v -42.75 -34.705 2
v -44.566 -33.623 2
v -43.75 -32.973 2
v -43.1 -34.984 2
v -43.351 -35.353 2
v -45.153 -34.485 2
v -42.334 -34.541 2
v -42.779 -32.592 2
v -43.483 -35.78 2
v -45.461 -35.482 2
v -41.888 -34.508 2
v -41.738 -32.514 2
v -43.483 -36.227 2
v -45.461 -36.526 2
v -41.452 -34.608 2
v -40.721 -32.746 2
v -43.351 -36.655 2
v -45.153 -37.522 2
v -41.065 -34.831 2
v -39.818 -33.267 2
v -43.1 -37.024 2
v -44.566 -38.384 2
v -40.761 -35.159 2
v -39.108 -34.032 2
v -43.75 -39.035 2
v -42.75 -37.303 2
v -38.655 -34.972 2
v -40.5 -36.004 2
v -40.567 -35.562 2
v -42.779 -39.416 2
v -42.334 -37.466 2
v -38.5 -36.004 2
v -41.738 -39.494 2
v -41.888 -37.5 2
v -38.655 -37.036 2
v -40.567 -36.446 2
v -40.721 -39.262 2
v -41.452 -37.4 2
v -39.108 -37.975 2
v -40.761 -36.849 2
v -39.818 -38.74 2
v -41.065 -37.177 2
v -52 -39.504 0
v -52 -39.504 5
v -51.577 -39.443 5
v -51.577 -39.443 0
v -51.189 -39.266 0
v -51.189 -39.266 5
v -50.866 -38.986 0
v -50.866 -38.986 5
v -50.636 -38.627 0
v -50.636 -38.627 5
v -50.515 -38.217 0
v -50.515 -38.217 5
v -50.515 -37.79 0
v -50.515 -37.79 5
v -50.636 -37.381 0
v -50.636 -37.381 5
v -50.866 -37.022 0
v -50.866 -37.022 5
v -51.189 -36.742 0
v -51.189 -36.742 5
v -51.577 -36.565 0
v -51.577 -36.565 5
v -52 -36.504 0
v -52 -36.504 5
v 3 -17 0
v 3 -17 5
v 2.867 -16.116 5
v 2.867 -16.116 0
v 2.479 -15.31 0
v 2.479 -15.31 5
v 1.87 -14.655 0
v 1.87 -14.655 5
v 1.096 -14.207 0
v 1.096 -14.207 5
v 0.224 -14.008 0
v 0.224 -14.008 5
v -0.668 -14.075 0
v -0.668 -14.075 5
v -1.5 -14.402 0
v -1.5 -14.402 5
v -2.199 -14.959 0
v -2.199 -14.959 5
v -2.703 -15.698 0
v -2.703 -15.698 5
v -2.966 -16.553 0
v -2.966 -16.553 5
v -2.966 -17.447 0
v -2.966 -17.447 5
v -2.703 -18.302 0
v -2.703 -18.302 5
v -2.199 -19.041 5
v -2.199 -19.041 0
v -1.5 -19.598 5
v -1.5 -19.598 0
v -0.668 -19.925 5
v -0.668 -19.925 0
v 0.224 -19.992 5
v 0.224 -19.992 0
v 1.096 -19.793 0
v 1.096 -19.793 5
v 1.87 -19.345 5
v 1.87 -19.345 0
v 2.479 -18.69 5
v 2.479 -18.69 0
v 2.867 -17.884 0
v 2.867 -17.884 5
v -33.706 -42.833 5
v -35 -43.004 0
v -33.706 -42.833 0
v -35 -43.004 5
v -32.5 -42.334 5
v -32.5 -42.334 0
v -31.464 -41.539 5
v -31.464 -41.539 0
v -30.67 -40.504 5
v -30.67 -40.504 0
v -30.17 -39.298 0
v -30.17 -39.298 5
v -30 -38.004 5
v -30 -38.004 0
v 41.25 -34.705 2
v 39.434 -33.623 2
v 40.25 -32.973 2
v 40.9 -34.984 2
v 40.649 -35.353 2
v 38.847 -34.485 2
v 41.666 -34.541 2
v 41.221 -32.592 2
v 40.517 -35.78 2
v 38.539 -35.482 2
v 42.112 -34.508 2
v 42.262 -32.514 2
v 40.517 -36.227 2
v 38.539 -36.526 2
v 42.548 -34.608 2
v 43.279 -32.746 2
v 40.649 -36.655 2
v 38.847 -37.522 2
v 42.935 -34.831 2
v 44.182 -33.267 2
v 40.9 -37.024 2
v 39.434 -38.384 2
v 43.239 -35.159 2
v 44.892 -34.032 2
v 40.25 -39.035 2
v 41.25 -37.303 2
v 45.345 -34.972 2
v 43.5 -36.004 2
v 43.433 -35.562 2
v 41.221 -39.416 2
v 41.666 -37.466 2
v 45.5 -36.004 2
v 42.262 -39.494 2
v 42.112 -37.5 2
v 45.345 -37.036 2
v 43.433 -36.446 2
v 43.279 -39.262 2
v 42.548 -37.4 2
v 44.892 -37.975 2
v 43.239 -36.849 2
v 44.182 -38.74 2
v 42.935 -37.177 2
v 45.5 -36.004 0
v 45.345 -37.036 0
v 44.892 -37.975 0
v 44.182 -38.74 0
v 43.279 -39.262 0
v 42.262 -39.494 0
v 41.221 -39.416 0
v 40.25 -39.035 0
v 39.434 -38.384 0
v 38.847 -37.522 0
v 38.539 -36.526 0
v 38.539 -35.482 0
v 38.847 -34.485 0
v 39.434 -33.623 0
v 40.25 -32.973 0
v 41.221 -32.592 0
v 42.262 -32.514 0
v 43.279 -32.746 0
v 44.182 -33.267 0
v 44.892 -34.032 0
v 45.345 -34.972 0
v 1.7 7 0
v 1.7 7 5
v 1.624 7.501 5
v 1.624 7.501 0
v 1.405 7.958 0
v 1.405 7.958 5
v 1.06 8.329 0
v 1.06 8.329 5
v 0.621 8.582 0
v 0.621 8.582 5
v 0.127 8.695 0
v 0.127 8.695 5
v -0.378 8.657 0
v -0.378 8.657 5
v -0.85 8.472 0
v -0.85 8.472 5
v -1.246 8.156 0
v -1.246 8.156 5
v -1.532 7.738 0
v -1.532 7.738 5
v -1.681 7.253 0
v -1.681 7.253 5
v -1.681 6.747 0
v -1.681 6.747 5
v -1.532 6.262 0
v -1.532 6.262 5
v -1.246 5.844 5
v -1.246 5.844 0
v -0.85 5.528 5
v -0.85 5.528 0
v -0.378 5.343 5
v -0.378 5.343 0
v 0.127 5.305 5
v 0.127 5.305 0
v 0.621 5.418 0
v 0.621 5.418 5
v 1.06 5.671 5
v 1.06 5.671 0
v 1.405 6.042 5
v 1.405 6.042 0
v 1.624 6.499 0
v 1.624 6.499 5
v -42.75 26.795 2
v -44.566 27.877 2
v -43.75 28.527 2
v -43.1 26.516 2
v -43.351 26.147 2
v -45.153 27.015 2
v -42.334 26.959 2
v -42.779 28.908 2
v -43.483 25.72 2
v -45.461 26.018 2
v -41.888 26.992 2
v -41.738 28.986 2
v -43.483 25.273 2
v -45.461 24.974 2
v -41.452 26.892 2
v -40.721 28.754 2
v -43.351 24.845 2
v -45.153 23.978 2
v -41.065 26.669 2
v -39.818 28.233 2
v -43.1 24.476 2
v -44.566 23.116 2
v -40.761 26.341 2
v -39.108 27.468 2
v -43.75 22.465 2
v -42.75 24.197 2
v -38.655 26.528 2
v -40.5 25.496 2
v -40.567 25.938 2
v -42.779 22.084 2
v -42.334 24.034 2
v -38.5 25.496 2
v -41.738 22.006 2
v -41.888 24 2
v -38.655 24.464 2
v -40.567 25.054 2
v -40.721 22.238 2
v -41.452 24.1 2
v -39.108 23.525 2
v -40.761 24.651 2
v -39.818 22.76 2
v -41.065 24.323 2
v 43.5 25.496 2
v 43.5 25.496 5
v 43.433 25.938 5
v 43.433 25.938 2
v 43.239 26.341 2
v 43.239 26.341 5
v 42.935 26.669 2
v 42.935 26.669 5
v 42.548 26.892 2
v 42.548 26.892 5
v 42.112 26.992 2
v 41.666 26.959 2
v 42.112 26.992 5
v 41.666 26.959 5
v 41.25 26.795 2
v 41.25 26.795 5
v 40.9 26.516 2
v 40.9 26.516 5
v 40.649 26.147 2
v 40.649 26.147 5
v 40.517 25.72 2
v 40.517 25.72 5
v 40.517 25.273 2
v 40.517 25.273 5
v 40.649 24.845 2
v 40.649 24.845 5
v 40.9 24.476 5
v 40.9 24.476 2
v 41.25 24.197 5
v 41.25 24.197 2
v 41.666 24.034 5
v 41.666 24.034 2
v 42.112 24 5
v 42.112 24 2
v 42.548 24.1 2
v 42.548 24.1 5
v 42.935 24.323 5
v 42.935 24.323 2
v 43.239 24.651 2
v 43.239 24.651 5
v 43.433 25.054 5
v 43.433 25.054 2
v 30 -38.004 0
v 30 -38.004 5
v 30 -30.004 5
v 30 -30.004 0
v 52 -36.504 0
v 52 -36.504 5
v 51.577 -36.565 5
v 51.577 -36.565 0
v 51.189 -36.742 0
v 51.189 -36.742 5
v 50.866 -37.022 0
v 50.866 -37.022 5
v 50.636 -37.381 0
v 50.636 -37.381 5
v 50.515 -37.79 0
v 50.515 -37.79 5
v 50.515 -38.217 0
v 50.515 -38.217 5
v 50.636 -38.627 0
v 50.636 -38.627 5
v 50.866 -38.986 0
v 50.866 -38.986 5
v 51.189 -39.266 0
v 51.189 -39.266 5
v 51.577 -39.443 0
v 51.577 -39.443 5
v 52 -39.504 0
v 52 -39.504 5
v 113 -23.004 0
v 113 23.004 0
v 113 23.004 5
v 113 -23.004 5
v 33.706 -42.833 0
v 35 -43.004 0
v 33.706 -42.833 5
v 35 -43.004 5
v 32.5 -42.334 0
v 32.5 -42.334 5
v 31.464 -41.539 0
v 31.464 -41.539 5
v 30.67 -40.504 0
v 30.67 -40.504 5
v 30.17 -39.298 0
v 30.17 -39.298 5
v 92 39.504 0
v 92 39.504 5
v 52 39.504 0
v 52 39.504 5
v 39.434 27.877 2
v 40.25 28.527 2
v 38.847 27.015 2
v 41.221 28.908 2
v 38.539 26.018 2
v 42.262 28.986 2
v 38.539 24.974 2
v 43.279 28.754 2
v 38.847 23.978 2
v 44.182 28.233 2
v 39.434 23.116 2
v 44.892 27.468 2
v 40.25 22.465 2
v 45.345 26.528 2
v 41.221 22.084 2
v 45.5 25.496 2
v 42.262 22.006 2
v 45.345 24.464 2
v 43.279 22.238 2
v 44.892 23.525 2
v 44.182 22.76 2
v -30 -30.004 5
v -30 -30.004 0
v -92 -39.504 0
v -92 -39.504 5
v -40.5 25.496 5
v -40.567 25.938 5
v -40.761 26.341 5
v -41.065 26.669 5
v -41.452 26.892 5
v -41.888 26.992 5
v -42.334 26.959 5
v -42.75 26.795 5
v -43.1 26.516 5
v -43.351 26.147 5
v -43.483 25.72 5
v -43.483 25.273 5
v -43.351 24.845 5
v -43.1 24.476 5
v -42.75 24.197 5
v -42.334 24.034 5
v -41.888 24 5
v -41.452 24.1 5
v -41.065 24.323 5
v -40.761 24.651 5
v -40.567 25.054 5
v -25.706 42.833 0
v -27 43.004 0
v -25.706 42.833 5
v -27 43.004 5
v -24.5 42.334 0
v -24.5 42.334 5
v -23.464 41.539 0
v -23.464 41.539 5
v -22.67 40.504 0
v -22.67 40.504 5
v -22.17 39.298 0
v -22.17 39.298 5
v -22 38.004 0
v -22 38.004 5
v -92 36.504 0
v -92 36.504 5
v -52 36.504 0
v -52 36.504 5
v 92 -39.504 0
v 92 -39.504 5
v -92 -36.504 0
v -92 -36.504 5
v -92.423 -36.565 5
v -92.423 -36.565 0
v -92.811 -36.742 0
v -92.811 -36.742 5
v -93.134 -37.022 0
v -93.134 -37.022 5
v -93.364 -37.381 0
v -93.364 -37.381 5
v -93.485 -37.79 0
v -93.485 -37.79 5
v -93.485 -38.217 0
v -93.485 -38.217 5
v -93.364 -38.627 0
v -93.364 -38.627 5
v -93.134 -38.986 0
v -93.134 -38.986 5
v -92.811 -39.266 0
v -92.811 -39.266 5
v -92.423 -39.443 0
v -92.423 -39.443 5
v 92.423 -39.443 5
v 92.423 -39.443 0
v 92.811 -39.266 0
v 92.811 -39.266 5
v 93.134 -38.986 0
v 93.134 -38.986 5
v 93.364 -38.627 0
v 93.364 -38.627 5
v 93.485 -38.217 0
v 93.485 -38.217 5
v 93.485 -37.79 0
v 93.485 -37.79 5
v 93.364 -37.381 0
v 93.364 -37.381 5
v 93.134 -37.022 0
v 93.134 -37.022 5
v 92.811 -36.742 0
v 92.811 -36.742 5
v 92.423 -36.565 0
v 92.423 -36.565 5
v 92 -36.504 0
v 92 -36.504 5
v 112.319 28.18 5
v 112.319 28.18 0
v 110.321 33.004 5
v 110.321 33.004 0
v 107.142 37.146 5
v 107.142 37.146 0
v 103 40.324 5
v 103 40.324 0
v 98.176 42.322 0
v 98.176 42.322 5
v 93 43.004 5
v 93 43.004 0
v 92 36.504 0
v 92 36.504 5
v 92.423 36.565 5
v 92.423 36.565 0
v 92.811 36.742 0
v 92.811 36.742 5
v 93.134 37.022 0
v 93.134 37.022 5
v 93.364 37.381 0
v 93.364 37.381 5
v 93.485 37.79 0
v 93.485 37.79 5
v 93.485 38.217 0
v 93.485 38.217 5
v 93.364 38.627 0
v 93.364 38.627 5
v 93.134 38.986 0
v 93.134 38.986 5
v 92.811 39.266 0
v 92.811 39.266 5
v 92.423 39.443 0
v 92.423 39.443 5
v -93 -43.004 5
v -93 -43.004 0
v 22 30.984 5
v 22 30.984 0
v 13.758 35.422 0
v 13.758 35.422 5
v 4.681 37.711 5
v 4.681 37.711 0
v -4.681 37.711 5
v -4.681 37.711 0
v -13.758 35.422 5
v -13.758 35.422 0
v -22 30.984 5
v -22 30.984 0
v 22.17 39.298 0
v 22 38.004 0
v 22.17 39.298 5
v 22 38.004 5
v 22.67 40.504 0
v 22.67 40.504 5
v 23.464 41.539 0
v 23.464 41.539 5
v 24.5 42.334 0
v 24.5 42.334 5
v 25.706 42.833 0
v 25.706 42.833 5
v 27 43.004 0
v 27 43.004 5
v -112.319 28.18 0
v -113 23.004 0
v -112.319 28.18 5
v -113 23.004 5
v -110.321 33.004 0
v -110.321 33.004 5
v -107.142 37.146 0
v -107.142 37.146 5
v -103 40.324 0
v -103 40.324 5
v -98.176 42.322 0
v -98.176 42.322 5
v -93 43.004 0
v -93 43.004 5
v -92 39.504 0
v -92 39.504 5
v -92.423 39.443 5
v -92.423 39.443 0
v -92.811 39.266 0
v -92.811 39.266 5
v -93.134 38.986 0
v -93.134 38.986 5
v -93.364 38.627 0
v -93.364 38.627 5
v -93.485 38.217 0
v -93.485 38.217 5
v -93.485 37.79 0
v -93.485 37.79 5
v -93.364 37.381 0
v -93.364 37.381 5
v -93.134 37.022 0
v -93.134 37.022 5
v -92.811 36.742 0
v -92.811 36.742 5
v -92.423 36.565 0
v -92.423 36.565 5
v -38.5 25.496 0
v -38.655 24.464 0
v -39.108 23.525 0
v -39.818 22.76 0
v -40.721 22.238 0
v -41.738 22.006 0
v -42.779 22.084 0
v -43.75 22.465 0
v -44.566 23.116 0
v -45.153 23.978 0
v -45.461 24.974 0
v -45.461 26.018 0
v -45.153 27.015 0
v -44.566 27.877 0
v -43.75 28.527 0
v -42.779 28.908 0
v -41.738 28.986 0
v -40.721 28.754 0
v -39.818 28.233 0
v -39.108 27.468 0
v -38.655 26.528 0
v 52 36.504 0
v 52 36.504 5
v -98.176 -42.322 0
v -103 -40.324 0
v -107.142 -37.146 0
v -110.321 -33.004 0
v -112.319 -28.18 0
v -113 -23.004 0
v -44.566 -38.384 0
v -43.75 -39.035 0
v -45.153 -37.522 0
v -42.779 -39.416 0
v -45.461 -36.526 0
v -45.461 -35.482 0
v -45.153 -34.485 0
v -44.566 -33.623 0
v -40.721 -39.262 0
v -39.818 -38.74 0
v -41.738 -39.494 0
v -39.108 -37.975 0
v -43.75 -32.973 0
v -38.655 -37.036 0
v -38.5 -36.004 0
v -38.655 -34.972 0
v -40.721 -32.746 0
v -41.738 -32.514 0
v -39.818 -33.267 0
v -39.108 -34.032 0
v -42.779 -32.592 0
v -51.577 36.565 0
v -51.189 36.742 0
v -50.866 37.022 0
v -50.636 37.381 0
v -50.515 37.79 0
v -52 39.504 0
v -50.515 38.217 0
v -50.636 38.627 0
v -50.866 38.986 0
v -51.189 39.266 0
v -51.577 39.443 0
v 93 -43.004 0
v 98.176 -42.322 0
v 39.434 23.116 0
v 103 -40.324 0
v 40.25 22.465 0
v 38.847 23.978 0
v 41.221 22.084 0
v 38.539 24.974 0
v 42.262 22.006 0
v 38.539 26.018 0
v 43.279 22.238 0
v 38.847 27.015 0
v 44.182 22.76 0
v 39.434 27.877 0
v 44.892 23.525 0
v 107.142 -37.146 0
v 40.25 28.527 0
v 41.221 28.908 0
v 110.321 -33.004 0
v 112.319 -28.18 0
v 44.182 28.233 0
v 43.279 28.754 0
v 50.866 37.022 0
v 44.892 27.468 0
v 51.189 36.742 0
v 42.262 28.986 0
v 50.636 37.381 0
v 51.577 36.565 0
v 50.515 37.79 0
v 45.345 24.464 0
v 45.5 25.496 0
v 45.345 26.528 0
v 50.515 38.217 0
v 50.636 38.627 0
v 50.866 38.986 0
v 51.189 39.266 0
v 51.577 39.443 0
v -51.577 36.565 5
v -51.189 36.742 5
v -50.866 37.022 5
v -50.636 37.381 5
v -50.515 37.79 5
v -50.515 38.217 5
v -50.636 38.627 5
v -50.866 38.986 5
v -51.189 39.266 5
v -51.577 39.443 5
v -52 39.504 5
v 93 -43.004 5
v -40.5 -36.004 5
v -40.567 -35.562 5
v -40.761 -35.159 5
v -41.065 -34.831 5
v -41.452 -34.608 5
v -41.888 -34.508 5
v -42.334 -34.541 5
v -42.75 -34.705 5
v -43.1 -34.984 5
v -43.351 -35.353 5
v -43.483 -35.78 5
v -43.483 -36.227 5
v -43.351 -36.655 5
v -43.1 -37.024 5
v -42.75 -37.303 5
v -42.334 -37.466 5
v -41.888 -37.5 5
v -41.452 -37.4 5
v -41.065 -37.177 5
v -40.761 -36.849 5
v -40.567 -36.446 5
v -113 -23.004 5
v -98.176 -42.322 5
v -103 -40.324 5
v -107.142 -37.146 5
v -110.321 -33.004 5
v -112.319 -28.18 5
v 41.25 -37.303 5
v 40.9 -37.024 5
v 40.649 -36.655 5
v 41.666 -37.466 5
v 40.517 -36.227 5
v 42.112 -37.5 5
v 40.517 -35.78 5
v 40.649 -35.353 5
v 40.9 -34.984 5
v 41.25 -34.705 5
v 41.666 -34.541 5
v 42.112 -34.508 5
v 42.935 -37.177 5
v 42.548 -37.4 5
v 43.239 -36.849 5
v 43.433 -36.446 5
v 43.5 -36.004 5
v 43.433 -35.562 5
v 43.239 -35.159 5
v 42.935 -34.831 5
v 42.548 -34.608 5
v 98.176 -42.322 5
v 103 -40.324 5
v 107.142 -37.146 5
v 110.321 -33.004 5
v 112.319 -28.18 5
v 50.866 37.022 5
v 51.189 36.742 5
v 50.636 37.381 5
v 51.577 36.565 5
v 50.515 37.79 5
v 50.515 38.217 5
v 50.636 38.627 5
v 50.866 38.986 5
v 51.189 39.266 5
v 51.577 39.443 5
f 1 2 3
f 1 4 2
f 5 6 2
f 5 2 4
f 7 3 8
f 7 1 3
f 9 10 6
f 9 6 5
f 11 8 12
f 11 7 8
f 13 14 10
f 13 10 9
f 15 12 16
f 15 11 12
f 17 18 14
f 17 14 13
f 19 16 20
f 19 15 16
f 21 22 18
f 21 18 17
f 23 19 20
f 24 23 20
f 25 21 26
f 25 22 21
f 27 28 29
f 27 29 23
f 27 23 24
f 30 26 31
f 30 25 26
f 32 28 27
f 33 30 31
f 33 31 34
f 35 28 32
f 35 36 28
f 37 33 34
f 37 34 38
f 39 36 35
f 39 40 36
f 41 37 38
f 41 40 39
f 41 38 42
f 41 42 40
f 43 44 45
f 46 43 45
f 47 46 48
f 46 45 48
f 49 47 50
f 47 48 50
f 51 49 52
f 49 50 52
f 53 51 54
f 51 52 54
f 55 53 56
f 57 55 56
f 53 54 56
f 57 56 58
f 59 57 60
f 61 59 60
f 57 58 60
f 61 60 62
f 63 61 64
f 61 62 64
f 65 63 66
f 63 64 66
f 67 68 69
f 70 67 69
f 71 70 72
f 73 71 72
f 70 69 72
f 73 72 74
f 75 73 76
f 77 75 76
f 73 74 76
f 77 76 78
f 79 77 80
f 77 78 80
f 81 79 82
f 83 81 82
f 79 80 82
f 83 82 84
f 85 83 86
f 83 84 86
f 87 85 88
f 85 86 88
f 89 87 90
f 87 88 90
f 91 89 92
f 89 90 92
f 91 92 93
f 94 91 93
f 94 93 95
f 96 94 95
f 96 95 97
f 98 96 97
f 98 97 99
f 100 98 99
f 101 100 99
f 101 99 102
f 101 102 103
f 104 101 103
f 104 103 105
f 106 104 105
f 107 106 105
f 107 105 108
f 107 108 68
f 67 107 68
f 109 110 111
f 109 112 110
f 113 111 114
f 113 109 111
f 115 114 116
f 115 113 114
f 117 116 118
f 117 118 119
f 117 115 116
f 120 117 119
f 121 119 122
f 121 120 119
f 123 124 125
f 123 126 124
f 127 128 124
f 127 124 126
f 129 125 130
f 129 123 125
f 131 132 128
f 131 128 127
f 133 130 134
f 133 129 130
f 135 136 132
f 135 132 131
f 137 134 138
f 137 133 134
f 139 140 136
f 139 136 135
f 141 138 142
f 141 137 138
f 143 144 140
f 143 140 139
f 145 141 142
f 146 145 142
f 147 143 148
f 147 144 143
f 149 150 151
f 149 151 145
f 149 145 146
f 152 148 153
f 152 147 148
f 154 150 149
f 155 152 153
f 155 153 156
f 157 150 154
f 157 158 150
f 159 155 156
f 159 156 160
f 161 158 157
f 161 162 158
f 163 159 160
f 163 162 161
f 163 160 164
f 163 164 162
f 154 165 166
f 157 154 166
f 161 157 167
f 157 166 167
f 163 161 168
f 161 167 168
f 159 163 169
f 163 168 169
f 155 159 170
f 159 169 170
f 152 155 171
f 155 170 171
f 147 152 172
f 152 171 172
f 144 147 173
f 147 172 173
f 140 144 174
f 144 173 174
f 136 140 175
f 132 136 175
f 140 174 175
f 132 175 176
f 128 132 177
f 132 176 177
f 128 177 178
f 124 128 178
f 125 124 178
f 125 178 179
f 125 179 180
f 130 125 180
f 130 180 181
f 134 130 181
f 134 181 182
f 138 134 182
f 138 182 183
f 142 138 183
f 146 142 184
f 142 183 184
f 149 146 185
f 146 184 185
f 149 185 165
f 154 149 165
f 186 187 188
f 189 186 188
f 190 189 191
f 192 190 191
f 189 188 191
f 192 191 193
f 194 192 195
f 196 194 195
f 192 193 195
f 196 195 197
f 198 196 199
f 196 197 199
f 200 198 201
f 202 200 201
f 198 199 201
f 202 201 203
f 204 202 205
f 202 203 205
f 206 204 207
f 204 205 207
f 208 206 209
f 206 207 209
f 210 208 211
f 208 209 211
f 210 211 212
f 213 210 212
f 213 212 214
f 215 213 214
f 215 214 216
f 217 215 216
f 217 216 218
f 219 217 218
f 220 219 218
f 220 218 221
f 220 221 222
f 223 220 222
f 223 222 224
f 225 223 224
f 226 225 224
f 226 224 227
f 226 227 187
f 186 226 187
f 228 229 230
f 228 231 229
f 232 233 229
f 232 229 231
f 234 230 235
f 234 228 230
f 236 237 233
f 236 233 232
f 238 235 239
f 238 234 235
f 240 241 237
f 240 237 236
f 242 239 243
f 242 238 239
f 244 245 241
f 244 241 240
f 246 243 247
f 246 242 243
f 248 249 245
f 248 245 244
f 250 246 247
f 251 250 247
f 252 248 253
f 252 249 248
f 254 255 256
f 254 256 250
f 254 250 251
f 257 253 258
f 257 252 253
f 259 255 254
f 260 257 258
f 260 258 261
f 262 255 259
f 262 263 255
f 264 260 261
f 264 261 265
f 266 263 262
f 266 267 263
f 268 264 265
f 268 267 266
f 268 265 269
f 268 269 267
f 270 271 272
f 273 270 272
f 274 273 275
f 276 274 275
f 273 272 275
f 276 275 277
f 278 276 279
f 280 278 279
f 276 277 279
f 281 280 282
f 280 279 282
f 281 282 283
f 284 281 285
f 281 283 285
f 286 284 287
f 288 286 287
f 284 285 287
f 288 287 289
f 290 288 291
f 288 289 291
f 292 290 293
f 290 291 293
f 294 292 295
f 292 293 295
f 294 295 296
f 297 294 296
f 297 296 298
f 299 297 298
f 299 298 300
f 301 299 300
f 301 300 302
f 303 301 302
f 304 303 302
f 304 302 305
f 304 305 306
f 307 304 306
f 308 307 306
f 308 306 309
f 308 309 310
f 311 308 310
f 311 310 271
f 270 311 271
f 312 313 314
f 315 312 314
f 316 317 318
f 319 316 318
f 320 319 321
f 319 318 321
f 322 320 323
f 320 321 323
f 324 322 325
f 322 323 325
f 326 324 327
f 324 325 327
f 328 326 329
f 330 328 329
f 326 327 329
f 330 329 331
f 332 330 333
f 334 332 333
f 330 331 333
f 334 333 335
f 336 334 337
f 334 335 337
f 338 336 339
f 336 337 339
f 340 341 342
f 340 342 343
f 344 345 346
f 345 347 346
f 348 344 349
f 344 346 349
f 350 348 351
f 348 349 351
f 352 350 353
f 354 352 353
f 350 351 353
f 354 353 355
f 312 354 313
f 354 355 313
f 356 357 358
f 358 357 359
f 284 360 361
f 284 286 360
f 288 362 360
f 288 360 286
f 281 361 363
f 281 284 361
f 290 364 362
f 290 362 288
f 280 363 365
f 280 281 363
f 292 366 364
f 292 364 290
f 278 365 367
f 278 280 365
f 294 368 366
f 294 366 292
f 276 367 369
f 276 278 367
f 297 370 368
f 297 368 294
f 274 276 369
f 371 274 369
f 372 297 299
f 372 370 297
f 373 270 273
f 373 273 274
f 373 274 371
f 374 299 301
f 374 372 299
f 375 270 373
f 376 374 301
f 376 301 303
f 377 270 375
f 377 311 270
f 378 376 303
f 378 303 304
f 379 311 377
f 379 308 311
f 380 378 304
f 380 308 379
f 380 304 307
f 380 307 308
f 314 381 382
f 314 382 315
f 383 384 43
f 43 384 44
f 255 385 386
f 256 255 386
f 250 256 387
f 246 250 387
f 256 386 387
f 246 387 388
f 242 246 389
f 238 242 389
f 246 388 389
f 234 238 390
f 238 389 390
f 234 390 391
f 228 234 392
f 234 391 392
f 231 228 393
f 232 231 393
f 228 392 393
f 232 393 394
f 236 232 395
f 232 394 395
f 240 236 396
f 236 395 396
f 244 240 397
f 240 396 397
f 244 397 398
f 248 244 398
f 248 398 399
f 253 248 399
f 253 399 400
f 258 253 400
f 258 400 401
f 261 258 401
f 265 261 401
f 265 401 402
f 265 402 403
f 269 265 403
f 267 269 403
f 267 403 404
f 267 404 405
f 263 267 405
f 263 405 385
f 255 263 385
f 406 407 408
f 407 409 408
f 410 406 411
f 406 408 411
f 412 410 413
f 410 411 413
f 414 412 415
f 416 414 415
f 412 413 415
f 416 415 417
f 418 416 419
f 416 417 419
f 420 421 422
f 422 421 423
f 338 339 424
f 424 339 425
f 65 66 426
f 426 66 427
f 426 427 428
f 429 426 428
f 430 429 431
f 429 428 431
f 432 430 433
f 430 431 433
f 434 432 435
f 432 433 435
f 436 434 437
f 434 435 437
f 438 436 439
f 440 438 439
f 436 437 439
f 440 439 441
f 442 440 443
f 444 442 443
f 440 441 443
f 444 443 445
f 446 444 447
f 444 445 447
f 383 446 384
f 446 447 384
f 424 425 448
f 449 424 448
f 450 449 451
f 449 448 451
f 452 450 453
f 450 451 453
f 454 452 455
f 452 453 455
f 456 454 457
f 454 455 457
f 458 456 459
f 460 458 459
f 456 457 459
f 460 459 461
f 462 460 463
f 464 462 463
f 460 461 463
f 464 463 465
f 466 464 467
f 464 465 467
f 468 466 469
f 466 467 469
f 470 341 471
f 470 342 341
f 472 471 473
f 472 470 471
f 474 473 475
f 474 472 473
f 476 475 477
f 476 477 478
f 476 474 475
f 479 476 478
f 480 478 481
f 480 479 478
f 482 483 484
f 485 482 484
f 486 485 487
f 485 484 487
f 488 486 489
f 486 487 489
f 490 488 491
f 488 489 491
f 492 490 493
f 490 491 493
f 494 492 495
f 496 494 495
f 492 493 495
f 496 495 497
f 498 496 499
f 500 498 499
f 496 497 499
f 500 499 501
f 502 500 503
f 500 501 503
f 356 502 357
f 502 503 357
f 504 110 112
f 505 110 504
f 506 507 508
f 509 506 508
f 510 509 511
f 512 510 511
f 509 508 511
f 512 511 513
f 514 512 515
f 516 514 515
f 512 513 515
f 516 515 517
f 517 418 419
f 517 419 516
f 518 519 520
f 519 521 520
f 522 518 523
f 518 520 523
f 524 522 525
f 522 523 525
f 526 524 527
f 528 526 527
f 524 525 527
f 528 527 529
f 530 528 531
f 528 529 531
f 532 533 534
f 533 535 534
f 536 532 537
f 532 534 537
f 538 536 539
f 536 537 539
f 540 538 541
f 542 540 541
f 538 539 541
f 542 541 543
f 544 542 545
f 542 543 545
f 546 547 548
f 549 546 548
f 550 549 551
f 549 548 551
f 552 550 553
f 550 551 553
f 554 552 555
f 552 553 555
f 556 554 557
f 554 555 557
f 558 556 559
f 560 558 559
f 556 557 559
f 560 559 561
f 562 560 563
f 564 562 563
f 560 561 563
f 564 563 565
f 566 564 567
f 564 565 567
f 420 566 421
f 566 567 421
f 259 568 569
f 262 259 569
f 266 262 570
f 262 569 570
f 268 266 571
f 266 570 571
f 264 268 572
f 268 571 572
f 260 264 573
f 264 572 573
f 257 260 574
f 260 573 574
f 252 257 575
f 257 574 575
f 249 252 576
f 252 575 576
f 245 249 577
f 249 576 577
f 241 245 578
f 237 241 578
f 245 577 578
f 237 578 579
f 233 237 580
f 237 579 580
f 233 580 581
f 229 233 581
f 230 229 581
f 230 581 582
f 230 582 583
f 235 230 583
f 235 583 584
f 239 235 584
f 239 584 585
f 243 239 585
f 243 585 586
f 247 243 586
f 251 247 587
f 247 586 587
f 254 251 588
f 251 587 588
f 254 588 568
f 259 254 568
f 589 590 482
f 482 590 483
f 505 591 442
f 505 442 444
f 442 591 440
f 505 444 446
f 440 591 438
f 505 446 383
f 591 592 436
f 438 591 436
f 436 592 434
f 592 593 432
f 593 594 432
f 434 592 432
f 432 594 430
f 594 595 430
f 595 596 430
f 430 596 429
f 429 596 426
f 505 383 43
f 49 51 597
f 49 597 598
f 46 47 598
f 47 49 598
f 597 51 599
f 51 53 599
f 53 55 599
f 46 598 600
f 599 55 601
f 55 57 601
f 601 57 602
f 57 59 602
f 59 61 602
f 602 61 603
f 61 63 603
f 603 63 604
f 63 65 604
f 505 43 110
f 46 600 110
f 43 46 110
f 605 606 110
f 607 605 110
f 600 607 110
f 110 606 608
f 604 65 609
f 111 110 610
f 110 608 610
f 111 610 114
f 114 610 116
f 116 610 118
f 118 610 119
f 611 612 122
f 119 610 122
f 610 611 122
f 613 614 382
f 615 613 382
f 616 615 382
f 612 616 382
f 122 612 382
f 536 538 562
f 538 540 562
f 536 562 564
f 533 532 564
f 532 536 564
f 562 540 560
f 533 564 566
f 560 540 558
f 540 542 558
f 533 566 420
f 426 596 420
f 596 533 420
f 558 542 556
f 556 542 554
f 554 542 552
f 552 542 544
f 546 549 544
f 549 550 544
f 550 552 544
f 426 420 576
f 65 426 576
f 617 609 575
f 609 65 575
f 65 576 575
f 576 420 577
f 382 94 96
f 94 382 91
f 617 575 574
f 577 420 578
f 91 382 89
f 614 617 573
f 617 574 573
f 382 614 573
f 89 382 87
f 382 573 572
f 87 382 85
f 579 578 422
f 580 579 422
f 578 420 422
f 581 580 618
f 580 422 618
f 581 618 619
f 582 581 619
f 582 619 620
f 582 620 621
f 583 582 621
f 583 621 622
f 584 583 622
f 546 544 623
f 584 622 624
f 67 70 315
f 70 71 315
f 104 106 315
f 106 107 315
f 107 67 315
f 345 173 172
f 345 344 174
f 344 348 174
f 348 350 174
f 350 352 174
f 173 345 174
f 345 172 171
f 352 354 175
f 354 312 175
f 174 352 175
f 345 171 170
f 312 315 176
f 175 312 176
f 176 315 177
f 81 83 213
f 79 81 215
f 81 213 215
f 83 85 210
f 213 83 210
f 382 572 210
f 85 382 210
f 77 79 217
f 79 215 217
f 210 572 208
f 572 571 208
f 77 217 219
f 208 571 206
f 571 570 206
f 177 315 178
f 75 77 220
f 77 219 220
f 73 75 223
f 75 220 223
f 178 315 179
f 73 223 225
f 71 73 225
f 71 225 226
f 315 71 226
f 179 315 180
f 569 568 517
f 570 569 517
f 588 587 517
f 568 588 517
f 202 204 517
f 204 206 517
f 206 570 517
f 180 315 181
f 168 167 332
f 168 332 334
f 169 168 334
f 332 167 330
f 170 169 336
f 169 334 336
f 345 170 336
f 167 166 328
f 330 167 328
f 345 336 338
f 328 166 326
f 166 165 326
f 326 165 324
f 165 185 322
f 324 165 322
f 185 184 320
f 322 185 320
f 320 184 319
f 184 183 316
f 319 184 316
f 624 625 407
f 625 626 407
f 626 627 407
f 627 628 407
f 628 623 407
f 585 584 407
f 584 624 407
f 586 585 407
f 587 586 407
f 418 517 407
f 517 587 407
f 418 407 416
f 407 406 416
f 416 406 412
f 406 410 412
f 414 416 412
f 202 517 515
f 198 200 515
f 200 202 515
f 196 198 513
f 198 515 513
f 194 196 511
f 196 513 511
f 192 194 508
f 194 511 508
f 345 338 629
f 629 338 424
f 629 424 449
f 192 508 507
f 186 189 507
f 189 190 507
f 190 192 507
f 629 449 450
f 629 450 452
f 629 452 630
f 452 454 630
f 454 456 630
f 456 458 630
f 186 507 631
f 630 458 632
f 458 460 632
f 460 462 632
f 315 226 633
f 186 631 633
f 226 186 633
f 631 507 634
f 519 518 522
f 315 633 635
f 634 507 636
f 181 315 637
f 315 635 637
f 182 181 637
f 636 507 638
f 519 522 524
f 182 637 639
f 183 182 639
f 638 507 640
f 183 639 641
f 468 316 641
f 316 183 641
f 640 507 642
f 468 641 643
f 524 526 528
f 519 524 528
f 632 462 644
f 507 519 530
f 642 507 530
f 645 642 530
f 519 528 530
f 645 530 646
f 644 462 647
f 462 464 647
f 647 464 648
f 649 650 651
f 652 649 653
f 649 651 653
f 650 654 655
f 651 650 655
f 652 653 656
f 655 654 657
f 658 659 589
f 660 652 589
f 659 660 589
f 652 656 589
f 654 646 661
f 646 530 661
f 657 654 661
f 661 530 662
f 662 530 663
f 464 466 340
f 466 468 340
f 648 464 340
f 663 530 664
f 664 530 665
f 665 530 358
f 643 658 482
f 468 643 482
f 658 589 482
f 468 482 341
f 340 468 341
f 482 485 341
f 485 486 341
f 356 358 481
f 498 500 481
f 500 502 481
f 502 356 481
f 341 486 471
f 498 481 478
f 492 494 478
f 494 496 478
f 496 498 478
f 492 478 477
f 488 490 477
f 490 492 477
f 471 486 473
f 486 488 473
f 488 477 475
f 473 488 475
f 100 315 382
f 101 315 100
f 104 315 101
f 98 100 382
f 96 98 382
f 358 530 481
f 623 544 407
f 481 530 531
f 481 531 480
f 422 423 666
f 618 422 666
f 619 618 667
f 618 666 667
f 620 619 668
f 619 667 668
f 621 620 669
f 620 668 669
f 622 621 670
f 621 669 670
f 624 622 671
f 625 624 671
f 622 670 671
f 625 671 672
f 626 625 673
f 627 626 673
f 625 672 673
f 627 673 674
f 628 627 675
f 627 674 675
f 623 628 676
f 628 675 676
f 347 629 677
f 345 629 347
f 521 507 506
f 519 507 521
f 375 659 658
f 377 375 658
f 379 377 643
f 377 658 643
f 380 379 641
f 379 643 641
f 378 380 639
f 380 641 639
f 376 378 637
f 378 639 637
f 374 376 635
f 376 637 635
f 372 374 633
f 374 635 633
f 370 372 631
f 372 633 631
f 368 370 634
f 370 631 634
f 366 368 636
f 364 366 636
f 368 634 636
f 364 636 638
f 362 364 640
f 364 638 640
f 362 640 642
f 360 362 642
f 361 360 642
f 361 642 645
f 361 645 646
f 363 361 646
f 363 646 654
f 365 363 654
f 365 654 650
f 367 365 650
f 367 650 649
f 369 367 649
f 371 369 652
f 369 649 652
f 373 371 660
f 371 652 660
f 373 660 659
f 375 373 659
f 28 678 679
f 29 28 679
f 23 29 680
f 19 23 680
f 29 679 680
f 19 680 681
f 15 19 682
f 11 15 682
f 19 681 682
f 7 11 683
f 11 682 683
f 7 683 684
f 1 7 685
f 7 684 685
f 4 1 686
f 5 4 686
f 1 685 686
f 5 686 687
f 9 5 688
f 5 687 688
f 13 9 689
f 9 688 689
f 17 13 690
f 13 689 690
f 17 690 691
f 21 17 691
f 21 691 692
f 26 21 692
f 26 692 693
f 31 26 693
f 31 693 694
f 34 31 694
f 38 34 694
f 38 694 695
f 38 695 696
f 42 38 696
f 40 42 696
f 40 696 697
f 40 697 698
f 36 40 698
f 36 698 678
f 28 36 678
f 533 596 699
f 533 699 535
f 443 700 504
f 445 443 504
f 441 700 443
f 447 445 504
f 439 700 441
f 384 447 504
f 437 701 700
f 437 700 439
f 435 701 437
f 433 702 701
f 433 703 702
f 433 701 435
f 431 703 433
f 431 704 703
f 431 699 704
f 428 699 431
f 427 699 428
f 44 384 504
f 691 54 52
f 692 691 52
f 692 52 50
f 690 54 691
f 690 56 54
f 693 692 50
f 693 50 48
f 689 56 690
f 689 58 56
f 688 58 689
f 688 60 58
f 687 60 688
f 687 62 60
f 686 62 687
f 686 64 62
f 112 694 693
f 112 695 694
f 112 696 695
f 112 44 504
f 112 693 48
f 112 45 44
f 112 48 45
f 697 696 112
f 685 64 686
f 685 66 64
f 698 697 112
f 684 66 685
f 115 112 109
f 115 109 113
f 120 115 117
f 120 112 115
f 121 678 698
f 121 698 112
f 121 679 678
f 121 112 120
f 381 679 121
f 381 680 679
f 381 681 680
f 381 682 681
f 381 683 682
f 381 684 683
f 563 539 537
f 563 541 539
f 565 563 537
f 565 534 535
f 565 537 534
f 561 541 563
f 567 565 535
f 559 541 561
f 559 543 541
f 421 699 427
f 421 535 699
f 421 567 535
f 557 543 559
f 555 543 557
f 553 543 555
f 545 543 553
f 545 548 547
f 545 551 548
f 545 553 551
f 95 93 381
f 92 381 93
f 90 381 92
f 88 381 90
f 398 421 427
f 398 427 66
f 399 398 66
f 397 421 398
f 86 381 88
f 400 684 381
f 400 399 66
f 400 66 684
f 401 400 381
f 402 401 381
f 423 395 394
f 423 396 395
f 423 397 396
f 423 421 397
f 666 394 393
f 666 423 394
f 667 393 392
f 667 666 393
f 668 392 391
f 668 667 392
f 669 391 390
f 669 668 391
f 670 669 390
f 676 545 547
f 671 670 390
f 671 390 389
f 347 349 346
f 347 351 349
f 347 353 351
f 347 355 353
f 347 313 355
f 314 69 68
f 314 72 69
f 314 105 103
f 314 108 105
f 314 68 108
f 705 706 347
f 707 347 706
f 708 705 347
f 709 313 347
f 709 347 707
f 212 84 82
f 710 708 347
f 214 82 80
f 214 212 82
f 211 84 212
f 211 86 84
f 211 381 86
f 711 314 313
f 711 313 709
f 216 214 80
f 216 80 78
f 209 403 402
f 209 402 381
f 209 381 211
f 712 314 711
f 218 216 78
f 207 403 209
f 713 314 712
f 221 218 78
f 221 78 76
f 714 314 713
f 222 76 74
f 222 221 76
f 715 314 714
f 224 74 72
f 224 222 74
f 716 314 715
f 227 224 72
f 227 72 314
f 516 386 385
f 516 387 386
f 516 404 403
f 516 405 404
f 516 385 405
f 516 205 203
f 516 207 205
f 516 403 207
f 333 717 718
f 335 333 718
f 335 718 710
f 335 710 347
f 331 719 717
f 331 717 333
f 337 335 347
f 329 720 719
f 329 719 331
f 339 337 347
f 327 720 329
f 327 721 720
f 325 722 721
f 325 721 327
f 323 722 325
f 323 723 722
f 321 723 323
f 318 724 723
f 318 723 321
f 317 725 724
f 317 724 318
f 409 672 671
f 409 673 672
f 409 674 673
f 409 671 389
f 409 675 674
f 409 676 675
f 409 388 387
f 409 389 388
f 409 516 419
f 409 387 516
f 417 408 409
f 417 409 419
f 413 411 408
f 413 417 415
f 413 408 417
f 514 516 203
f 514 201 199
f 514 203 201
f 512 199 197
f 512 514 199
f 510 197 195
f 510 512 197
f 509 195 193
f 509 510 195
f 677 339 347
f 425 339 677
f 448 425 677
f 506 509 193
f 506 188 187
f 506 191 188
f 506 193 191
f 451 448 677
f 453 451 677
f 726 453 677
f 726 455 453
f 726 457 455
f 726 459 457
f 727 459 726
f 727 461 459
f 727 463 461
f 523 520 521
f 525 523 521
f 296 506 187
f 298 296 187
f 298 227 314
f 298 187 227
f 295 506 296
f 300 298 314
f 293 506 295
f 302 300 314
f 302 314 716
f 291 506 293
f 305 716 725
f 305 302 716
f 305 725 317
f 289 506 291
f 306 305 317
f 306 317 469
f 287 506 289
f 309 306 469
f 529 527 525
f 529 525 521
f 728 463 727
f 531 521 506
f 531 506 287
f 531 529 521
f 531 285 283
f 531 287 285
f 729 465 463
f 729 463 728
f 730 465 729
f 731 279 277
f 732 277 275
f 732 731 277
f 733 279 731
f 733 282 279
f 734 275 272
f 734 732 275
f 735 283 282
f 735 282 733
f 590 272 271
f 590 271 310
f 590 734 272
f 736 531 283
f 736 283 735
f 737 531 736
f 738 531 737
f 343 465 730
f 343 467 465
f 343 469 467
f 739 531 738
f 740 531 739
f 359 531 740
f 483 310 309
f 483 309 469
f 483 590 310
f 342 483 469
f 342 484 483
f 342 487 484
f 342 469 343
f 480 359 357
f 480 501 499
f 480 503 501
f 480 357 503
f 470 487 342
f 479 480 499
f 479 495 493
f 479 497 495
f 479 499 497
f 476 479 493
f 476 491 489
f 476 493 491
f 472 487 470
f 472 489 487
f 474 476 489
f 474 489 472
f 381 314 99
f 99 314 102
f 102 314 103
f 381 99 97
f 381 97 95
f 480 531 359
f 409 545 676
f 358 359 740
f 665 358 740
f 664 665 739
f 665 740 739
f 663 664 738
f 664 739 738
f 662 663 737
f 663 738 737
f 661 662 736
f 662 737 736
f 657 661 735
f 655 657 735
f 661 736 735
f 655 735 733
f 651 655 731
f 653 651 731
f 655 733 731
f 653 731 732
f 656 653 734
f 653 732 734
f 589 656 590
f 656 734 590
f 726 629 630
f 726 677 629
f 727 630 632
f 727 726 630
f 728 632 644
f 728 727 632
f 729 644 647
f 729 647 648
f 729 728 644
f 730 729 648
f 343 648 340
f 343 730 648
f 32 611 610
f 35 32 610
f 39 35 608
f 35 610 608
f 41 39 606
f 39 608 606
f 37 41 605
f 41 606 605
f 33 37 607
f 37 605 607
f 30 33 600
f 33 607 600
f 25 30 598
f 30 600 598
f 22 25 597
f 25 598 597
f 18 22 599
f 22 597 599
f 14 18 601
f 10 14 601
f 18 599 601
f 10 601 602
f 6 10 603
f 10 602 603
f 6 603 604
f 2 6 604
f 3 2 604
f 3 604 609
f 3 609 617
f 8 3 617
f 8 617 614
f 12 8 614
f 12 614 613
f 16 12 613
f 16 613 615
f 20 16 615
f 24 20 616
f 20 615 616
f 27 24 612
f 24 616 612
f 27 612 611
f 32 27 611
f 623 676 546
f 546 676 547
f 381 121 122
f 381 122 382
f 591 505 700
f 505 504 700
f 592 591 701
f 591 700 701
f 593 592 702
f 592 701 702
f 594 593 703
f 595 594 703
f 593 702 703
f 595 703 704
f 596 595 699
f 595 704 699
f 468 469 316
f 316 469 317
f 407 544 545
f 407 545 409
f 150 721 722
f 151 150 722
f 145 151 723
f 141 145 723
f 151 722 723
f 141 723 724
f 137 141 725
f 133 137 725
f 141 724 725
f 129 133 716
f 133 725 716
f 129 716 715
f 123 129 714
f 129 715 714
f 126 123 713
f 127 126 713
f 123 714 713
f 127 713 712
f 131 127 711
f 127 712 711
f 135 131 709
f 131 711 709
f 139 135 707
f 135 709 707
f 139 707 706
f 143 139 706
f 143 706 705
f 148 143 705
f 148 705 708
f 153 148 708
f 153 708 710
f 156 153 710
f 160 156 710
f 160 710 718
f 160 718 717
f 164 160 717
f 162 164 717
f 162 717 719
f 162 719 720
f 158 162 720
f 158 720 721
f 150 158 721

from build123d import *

# Parameters (mm, degrees)
PAD_DEPTH       = 5
SKETCH001_R     = 3
SKETCH001_R_2   = 1.7
SKETCH001_R_3   = 1.5
SKETCH001_W     = 60
SKETCH001_H     = 20
POCKET_DEPTH    = 5.001
FILLET_R        = 5
FILLET001_R     = 20
SKETCH002_R     = 3.5
POCKET001_DEPTH = 2


with BuildPart() as part:
    # Sketch → Pad (new body)
    with BuildSketch(Plane.XY):
        with BuildLine():
            ThreePointArc((-22, -30.983867), (0, -38), (22, -30.983867))
            Line((22, -43.003867), (22, -30.983867))
            Line((113, -43.003867), (22, -43.003867))
            Line((113, 43.003867), (113, -43.003867))
            Line((22, 43.003867), (113, 43.003867))
            Line((22, 30.983867), (22, 43.003867))
            ThreePointArc((22, 30.983867), (0, 38), (-22, 30.983867))
            Line((-22, 43.003867), (-22, 30.983867))
            Line((-113, 43.003867), (-22, 43.003867))
            Line((-113, -43.003867), (-113, 43.003867))
            Line((-22, -43.003867), (-113, -43.003867))
            Line((-22, -30.983867), (-22, -43.003867))
        make_face()
    extrude(amount=PAD_DEPTH)

    # Sketch001 (on Face14 of Pad) → Pocket (cut, through all)
    with BuildSketch(Plane.XY.offset(5)):
        with Locations((0, -17)):
            Circle(SKETCH001_R)
        with Locations((0, 7)):
            Circle(SKETCH001_R_2)
        with Locations((42, 25.496133)):
            Circle(SKETCH001_R_3)
        with Locations((42, -36.003867)):
            Circle(SKETCH001_R_3)
        with Locations((-42, 25.496133)):
            Circle(SKETCH001_R_3)
        with Locations((-42, -36.003867)):
            Circle(SKETCH001_R_3)
        with Locations((0, -40.003867)):
            Rectangle(SKETCH001_W, SKETCH001_H)
        with BuildLine():
            ThreePointArc((-92, 39.503867), (-93.5, 38.003867), (-92, 36.503867))
            Line((-92, 36.503867), (-52, 36.503867))
            ThreePointArc((-52, 36.503867), (-50.5, 38.003867), (-52, 39.503867))
            Line((-52, 39.503867), (-92, 39.503867))
        make_face()
        with BuildLine():
            ThreePointArc((52, 39.503867), (50.5, 38.003867), (52, 36.503867))
            Line((52, 36.503867), (92, 36.503867))
            ThreePointArc((92, 36.503867), (93.5, 38.003867), (92, 39.503867))
            Line((92, 39.503867), (52, 39.503867))
        make_face()
        with BuildLine():
            ThreePointArc((-92, -36.503867), (-93.5, -38.003867), (-92, -39.503867))
            Line((-92, -39.503867), (-52, -39.503867))
            ThreePointArc((-52, -39.503867), (-50.5, -38.003867), (-52, -36.503867))
            Line((-52, -36.503867), (-92, -36.503867))
        make_face()
        with BuildLine():
            ThreePointArc((52, -36.503867), (50.5, -38.003867), (52, -39.503867))
            Line((52, -39.503867), (92, -39.503867))
            ThreePointArc((92, -39.503867), (93.5, -38.003867), (92, -36.503867))
            Line((92, -36.503867), (52, -36.503867))
        make_face()
    extrude(amount=-POCKET_DEPTH, mode=Mode.SUBTRACT)

    # Fillet
    fillet_edges = [part.edges().sort_by_distance(p)[0] for p in [
        (22, 43.003867, 2.5),
        (-22, 43.003867, 2.5),
        (30, -43.003867, 2.5),
        (-30, -43.003867, 2.5),
    ]]
    fillet(fillet_edges, radius=FILLET_R)

    # Fillet001
    fillet001_edges = [part.edges().sort_by_distance(p)[0] for p in [
        (-113, 43.003867, 2.5),
        (-113, -43.003867, 2.5),
        (113, 43.003867, 2.5),
        (113, -43.003867, 2.5),
    ]]
    fillet(fillet001_edges, radius=FILLET001_R)

    # Sketch002 (on Face1 of Fillet001) → Pocket001 (cut)
    with BuildSketch(Plane(origin=(0, 0, 0), x_dir=(1, 0, 0), z_dir=(0, 0, -1))):
        with Locations((-42, -25.496133)):
            Circle(SKETCH002_R)
        with Locations((-42, 36.003867)):
            Circle(SKETCH002_R)
        with Locations((42, 36.003867)):
            Circle(SKETCH002_R)
        with Locations((42, -25.496133)):
            Circle(SKETCH002_R)
    extrude(amount=-POCKET001_DEPTH, mode=Mode.SUBTRACT)


solid = part.part
